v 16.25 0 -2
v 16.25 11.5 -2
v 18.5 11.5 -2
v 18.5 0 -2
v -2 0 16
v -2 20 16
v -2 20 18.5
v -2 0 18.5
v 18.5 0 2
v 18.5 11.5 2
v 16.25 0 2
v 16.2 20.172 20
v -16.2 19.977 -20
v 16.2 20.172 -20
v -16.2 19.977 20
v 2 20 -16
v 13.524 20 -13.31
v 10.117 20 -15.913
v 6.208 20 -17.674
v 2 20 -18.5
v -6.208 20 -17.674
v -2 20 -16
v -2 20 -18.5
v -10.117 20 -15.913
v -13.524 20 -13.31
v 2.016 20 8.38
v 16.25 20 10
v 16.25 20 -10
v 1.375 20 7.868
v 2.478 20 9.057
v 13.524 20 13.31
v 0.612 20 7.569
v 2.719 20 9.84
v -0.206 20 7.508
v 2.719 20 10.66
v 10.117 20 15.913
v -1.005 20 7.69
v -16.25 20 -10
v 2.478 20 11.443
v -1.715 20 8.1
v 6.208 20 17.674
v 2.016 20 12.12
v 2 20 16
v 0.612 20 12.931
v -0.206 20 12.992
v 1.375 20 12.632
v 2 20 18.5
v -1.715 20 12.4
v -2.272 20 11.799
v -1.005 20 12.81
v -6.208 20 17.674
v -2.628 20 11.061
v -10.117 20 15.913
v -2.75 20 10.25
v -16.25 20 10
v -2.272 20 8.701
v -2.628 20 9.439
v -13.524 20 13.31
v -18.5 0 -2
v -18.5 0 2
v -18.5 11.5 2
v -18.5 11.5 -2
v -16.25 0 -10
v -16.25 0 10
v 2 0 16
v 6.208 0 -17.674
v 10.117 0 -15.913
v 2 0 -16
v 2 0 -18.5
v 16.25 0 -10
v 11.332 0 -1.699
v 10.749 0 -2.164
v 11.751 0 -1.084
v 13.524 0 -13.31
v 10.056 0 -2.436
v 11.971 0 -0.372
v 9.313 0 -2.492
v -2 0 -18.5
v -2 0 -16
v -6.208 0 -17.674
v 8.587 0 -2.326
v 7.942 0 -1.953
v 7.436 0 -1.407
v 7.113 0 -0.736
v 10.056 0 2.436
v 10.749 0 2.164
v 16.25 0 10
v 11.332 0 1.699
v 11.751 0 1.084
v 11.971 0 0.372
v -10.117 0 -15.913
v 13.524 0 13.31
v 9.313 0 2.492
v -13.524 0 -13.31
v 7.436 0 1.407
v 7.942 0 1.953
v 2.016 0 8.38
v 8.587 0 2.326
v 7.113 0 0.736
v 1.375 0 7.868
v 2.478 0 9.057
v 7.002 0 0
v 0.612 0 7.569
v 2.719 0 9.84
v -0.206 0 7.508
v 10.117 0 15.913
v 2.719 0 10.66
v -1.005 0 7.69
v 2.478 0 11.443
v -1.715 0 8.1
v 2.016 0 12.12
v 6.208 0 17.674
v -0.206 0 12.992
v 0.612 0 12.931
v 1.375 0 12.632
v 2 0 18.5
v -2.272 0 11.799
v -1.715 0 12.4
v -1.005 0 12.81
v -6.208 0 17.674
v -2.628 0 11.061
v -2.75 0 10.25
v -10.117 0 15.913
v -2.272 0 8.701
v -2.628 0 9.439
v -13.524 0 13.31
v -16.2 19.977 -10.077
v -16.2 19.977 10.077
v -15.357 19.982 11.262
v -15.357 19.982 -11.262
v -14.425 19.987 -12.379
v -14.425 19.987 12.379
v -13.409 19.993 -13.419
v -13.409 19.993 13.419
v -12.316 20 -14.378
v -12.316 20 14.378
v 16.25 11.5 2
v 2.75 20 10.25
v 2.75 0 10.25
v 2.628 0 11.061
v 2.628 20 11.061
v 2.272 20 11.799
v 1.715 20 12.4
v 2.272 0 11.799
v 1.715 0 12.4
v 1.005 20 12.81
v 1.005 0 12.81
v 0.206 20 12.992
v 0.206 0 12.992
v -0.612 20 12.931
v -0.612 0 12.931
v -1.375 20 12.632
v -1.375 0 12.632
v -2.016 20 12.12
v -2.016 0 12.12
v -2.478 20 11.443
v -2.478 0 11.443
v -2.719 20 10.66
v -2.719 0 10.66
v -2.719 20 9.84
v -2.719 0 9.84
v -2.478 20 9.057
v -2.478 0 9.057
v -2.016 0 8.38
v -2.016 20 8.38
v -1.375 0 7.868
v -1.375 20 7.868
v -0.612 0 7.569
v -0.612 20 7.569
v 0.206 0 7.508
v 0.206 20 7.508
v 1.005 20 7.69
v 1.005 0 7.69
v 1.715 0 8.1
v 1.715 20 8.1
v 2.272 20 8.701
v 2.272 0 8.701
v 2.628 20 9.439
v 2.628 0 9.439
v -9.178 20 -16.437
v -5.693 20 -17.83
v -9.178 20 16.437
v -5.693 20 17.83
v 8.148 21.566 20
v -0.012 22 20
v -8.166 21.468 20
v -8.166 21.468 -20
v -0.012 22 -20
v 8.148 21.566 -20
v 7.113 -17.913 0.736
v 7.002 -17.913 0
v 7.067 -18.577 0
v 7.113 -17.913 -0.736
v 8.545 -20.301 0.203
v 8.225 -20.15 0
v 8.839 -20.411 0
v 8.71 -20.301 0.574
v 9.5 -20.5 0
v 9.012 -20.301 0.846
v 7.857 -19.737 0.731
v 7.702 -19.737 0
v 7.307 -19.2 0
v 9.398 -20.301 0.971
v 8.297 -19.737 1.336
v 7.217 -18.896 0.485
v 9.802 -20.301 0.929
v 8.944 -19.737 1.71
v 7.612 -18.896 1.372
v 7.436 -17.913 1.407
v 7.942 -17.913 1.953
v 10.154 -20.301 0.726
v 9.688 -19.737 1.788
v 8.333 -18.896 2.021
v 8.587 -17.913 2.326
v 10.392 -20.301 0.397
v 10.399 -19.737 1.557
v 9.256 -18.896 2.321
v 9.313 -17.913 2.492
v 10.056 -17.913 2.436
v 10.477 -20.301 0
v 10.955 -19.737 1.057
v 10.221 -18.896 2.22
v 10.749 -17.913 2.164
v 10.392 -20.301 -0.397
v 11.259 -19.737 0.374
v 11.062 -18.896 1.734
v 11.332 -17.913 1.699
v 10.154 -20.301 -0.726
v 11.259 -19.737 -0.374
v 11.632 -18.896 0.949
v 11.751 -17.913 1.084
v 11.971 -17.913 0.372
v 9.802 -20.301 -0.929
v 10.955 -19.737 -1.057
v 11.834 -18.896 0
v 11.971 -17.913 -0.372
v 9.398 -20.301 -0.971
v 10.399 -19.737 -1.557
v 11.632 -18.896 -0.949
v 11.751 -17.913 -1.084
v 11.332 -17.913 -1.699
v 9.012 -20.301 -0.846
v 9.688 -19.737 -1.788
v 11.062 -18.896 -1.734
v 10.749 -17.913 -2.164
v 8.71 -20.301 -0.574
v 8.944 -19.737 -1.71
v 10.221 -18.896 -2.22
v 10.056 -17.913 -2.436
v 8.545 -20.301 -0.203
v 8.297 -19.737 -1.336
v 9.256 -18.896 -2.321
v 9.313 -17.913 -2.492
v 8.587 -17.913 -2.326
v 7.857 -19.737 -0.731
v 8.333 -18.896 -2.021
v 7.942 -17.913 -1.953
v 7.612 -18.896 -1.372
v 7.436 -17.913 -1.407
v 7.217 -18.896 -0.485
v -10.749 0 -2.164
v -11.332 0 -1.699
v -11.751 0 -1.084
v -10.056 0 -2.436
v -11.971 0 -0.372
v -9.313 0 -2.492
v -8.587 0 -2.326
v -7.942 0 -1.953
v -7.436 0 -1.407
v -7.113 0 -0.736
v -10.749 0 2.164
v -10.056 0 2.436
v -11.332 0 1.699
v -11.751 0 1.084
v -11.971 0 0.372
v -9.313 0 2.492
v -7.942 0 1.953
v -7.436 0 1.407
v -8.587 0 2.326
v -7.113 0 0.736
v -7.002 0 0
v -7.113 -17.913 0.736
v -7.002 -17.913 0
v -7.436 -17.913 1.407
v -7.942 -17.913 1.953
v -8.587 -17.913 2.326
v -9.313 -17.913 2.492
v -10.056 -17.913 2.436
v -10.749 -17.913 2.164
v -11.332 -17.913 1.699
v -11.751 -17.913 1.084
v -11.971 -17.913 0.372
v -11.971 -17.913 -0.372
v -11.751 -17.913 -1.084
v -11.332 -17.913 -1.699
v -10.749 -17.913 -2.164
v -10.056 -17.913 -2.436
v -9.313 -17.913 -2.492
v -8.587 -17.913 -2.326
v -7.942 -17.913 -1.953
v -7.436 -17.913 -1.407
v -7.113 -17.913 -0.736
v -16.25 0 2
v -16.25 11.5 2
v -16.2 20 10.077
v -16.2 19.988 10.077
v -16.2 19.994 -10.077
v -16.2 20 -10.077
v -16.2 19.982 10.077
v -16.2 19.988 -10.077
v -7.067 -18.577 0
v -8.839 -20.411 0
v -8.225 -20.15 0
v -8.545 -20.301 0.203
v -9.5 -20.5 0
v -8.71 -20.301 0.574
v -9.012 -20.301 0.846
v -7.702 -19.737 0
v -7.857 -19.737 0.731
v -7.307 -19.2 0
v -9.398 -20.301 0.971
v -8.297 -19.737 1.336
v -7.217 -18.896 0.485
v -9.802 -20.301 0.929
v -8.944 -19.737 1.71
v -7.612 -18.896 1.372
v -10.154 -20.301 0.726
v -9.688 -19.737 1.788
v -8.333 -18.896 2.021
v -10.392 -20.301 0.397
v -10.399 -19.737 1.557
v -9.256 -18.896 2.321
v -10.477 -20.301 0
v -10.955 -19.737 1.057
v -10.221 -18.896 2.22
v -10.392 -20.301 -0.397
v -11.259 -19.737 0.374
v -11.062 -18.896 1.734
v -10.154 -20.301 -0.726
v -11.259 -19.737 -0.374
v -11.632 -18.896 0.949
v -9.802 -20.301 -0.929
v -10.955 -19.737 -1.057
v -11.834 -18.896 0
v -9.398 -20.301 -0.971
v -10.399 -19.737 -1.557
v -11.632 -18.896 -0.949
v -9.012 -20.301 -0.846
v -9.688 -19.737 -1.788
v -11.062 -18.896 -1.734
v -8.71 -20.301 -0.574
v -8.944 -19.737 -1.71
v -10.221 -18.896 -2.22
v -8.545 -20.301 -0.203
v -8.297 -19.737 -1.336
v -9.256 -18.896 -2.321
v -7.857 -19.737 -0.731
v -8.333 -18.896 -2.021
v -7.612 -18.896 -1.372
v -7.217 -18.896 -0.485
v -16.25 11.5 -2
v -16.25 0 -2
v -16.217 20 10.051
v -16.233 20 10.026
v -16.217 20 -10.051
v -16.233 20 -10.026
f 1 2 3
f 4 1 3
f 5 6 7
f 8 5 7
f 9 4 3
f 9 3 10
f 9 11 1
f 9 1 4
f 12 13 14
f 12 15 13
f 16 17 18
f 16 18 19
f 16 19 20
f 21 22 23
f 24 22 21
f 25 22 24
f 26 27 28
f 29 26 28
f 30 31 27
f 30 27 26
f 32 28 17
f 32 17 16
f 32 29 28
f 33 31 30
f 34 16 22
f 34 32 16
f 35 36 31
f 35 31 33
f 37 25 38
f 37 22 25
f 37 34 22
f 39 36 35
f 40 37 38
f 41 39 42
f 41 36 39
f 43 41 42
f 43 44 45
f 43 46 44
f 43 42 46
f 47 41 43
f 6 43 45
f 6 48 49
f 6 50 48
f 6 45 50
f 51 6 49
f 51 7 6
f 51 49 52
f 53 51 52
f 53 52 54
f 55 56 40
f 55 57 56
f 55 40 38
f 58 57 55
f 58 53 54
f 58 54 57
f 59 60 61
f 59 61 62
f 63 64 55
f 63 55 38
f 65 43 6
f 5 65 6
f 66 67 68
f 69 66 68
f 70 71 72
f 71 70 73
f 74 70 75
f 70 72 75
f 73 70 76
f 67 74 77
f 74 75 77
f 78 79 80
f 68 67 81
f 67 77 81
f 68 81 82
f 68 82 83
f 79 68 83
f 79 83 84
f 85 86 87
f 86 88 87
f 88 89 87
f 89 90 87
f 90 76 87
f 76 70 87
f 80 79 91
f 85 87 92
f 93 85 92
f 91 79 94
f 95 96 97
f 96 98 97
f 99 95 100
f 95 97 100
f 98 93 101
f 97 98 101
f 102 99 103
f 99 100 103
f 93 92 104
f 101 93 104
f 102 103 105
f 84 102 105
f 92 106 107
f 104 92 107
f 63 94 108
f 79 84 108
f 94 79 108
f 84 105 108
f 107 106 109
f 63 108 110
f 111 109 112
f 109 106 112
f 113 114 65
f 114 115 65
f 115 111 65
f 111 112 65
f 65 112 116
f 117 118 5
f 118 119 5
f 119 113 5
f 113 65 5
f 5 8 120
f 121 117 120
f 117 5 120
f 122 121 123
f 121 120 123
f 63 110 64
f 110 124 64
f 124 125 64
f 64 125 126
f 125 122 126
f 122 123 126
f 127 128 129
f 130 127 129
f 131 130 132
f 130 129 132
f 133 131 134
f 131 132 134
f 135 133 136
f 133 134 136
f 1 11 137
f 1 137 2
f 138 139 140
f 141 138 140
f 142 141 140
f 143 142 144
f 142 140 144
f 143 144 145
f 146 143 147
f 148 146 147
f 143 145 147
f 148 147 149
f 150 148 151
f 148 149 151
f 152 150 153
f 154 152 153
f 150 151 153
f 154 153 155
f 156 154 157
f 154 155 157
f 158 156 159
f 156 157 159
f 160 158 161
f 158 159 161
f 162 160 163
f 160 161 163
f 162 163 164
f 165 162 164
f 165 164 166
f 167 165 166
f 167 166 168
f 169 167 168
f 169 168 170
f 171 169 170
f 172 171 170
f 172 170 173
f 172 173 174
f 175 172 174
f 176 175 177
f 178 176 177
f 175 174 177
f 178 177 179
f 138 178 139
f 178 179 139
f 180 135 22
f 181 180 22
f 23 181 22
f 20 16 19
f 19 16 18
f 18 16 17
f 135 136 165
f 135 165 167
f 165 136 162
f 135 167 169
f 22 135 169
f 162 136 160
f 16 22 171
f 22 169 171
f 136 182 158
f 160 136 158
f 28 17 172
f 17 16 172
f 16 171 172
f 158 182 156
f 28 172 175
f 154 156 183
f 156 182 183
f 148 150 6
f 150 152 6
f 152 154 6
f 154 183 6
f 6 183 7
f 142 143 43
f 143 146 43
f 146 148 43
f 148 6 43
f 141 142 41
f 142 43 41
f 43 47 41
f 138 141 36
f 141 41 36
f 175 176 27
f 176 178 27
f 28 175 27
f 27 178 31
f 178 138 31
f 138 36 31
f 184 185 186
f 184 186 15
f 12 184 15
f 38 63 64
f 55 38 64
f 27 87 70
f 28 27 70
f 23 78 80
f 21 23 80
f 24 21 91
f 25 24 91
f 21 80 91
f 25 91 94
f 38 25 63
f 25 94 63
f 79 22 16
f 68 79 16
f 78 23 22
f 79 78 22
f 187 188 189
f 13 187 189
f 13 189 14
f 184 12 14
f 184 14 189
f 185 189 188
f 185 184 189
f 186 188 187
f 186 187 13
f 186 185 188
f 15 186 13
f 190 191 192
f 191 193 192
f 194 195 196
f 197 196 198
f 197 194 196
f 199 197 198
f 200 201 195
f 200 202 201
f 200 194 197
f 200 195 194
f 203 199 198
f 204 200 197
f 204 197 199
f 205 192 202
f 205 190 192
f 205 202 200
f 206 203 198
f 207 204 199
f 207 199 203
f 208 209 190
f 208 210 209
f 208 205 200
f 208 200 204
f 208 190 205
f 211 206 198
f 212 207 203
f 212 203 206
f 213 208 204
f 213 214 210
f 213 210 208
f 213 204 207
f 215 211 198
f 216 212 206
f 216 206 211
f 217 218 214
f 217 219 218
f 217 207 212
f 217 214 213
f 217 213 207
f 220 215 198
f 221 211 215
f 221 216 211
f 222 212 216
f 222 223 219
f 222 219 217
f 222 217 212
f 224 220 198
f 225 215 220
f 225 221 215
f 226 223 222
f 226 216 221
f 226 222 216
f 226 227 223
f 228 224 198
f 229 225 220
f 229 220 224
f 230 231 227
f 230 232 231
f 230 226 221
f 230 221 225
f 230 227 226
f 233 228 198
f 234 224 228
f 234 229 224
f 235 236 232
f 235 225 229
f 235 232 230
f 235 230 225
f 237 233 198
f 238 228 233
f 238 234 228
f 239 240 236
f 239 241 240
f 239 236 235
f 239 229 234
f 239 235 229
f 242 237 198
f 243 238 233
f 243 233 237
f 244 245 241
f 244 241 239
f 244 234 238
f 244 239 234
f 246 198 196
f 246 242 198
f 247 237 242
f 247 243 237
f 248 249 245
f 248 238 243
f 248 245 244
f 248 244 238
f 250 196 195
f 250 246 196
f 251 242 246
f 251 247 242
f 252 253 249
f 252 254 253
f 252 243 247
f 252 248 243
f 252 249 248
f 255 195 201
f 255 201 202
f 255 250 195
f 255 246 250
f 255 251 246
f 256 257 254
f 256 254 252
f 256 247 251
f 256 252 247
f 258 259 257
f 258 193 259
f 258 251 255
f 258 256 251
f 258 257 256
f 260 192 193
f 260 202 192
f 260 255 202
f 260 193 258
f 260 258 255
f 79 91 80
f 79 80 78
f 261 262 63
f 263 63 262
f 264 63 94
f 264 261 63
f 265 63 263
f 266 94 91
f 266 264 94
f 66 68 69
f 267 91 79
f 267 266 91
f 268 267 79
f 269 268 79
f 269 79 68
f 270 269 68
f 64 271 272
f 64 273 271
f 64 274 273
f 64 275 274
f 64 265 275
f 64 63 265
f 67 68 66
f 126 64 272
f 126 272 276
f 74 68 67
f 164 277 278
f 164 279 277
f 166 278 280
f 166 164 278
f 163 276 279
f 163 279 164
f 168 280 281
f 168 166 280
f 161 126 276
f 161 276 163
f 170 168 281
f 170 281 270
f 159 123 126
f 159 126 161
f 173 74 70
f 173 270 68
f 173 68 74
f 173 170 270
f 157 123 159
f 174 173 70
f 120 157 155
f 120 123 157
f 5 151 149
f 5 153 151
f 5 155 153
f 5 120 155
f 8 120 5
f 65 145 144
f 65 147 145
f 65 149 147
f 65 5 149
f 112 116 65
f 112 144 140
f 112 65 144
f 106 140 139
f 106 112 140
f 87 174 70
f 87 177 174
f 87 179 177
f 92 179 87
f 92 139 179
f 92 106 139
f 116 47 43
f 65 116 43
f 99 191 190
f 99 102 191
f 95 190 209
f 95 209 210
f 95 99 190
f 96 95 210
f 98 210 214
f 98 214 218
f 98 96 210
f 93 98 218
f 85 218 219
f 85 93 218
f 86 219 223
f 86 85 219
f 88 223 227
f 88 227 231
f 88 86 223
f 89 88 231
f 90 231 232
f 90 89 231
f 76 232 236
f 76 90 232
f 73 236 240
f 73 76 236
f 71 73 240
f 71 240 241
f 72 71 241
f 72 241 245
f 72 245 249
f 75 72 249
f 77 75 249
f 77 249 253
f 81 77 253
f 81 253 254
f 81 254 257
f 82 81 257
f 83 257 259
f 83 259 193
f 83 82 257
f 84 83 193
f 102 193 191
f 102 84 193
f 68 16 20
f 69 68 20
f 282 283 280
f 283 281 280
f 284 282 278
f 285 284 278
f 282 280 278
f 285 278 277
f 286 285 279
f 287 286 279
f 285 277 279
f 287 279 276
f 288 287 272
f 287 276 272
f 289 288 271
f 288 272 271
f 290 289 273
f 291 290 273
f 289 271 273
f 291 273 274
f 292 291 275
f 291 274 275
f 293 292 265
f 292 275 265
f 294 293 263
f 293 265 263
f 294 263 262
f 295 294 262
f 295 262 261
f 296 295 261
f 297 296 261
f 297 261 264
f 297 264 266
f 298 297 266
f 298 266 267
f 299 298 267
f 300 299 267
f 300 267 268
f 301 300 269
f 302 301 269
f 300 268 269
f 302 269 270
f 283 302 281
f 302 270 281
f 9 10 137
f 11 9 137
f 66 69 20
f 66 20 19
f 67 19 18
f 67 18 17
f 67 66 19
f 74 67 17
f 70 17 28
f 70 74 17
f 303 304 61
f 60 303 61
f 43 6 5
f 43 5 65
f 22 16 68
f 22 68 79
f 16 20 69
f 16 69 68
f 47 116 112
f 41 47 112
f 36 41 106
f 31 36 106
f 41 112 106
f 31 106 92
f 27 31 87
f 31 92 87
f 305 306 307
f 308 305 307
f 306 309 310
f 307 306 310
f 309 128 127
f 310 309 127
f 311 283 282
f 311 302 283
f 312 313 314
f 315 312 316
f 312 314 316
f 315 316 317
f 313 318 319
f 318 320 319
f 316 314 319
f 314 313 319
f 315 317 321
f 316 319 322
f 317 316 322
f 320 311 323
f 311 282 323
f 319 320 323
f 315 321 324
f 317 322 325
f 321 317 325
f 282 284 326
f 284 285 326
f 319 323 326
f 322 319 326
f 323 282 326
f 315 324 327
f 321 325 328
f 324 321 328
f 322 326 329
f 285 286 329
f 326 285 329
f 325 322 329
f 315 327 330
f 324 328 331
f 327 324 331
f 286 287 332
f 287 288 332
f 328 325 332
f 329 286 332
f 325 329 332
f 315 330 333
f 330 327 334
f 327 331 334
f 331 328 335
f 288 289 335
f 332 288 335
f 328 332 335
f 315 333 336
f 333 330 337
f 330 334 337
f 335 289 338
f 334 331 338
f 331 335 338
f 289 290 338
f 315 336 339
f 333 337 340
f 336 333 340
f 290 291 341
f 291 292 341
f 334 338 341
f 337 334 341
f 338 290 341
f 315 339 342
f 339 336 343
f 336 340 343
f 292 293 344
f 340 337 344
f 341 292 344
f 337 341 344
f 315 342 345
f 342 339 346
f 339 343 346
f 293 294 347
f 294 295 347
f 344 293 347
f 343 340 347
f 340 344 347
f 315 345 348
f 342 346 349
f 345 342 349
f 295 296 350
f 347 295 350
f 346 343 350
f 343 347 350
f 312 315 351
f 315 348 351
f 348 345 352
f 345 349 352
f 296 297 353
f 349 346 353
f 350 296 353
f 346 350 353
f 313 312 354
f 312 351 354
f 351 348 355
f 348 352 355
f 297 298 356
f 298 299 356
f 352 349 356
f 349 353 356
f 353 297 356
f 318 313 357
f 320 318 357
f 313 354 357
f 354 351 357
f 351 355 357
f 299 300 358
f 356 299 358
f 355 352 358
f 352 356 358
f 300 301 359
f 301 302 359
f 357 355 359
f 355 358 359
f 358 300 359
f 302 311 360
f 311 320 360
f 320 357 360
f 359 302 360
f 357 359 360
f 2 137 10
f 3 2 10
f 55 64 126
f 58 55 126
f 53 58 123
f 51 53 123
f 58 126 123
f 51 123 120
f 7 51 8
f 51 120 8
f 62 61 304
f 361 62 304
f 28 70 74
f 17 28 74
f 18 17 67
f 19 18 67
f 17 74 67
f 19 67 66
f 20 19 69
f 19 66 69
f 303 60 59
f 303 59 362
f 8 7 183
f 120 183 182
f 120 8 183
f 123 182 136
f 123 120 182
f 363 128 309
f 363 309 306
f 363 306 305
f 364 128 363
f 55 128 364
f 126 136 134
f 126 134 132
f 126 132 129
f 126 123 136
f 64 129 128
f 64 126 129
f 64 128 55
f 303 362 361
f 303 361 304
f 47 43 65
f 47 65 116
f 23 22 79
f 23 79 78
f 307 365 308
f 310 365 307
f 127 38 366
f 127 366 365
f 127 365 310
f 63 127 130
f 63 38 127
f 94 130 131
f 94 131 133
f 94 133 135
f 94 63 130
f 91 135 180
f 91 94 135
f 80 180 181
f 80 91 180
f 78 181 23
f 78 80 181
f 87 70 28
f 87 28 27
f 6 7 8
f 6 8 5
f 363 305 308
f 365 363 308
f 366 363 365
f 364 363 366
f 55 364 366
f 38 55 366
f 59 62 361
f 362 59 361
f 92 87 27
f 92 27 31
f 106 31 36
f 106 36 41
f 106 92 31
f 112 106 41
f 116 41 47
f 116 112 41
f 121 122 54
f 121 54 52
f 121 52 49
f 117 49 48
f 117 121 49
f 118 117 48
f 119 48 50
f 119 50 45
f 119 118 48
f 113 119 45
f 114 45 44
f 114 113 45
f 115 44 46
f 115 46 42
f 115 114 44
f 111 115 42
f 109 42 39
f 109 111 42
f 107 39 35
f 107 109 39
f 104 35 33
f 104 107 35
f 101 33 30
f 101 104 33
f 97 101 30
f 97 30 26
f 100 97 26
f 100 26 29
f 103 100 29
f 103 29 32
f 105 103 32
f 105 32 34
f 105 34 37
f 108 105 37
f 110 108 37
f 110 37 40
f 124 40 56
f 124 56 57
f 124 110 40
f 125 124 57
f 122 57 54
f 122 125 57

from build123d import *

# Parameters (mm, degrees)
F1_DEPTH = 11.5
F0_R     = 2.5
F0_R_2   = 2.75
F2_DEPTH = 20
F3_DEPTH = 20
F8_DEPTH = 20
F9_DEPTH = 25


with BuildPart() as f1:
    # F0 (on Front) → F1 (new body)
    with BuildSketch(Plane.XZ):
        Polygon((18.5, 2), (16.25, 2), (16.25, -2), (18.5, -2), (18.5, 0), align=None)
    extrude(amount=-F1_DEPTH)


with BuildPart() as f1b:
    # F0 (on Front) → F1, piece 2 (new body)
    with BuildSketch(Plane.XZ):
        Polygon((-16.25, -2), (-16.25, 2), (-18.5, 2), (-18.5, 0), (-18.5, -2), align=None)
    extrude(amount=-F1_DEPTH)


with BuildPart() as f2:
    # F0 (on Front) → F2 (new body)
    with BuildSketch(Plane.XZ):
        with BuildLine():
            Line((-16.25, 10), (-16.25, 2))
            Line((-16.25, 2), (-16.25, -2))
            Line((-16.25, -2), (-16.25, -10))
            ThreePointArc((-16.25, -10), (-10.1171251196, -15.9132685828), (-2, -18.5))
            Line((-2, -18.5), (-2, -16))
            Line((-2, -16), (2, -16))
            Line((2, -16), (2, -18.5))
            ThreePointArc((2, -18.5), (10.1171251196, -15.9132685828), (16.25, -10))
            Line((16.25, -10), (16.25, -2))
            Line((16.25, -2), (16.25, 2))
            Line((16.25, 2), (16.25, 10))
            ThreePointArc((16.25, 10), (10.1171251196, 15.9132685828), (2, 18.5))
            Line((2, 18.5), (2, 16))
            Line((2, 16), (-2, 16))
            Line((-2, 16), (-2, 18.5))
            ThreePointArc((-2, 18.5), (-10.1171251196, 15.9132685828), (-16.25, 10))
        make_face()
        with Locations((-9.5, 0)):
            Circle(F0_R, mode=Mode.SUBTRACT)
        with Locations((9.5, 0)):
            Circle(F0_R, mode=Mode.SUBTRACT)
        with Locations((0, 10.25)):
            Circle(F0_R_2, mode=Mode.SUBTRACT)
        with Locations((0, 10.25)):
            Circle(F0_R_2)
        with Locations((9.5, 0)):
            Circle(F0_R)
        with Locations((-9.5, 0)):
            Circle(F0_R)
    extrude(amount=-F2_DEPTH)

    # F0 (on Front) → F3 (cut)
    with BuildSketch(Plane.XZ):
        with Locations((0, 10.25)):
            Circle(F0_R_2)
    extrude(amount=-F3_DEPTH, mode=Mode.SUBTRACT)

    # F4 (on Top) → F5 (revolve)
    with BuildSketch(Plane.XY):
        with BuildLine():
            Line((-9.5, 0), (-9.5, -20.5))
            ThreePointArc((-9.5, -20.5), (-7.7018017794, -19.7368025677), (-7.0015077705, -17.9131865274))
            Line((-7.0015077705, -17.9131865274), (-7.0015077705, 0))
            Line((-7.0015077705, 0), (-9.5, 0))
        make_face()
    revolve(axis=Axis((-9.5, -31.6412390172, 0), (0, -1, 0)))


with BuildPart() as f6_1:
    # F6: instance of F2
    add(f2.part.mirror(Plane.YZ))


with BuildPart() as f8:
    # F4 (on Top) → F8 (new body, symmetric)
    with BuildSketch(Plane.XY):
        with BuildLine():
            Line((-16.2000004202, 19.9765581638), (16.2, 20.1721042395))
            ThreePointArc((16.2, 20.1721042395), (-0.0116219214, 21.9999308346), (-16.2000004202, 19.9765581638))
        make_face()
    extrude(amount=F8_DEPTH, both=True)


with BuildPart() as f2_1:
    add(f2.part)

    # F9 (cut): a face of the model
    f9_faces = [f8.part.faces().sort_by_distance(p)[0] for p in [
        (-2.101e-07, 20.0743312016, 0),
    ]]
    extrude(f9_faces, amount=-F9_DEPTH, mode=Mode.SUBTRACT)


solid = Compound([f1.part, f1b.part, f6_1.part, f8.part, f2_1.part])
